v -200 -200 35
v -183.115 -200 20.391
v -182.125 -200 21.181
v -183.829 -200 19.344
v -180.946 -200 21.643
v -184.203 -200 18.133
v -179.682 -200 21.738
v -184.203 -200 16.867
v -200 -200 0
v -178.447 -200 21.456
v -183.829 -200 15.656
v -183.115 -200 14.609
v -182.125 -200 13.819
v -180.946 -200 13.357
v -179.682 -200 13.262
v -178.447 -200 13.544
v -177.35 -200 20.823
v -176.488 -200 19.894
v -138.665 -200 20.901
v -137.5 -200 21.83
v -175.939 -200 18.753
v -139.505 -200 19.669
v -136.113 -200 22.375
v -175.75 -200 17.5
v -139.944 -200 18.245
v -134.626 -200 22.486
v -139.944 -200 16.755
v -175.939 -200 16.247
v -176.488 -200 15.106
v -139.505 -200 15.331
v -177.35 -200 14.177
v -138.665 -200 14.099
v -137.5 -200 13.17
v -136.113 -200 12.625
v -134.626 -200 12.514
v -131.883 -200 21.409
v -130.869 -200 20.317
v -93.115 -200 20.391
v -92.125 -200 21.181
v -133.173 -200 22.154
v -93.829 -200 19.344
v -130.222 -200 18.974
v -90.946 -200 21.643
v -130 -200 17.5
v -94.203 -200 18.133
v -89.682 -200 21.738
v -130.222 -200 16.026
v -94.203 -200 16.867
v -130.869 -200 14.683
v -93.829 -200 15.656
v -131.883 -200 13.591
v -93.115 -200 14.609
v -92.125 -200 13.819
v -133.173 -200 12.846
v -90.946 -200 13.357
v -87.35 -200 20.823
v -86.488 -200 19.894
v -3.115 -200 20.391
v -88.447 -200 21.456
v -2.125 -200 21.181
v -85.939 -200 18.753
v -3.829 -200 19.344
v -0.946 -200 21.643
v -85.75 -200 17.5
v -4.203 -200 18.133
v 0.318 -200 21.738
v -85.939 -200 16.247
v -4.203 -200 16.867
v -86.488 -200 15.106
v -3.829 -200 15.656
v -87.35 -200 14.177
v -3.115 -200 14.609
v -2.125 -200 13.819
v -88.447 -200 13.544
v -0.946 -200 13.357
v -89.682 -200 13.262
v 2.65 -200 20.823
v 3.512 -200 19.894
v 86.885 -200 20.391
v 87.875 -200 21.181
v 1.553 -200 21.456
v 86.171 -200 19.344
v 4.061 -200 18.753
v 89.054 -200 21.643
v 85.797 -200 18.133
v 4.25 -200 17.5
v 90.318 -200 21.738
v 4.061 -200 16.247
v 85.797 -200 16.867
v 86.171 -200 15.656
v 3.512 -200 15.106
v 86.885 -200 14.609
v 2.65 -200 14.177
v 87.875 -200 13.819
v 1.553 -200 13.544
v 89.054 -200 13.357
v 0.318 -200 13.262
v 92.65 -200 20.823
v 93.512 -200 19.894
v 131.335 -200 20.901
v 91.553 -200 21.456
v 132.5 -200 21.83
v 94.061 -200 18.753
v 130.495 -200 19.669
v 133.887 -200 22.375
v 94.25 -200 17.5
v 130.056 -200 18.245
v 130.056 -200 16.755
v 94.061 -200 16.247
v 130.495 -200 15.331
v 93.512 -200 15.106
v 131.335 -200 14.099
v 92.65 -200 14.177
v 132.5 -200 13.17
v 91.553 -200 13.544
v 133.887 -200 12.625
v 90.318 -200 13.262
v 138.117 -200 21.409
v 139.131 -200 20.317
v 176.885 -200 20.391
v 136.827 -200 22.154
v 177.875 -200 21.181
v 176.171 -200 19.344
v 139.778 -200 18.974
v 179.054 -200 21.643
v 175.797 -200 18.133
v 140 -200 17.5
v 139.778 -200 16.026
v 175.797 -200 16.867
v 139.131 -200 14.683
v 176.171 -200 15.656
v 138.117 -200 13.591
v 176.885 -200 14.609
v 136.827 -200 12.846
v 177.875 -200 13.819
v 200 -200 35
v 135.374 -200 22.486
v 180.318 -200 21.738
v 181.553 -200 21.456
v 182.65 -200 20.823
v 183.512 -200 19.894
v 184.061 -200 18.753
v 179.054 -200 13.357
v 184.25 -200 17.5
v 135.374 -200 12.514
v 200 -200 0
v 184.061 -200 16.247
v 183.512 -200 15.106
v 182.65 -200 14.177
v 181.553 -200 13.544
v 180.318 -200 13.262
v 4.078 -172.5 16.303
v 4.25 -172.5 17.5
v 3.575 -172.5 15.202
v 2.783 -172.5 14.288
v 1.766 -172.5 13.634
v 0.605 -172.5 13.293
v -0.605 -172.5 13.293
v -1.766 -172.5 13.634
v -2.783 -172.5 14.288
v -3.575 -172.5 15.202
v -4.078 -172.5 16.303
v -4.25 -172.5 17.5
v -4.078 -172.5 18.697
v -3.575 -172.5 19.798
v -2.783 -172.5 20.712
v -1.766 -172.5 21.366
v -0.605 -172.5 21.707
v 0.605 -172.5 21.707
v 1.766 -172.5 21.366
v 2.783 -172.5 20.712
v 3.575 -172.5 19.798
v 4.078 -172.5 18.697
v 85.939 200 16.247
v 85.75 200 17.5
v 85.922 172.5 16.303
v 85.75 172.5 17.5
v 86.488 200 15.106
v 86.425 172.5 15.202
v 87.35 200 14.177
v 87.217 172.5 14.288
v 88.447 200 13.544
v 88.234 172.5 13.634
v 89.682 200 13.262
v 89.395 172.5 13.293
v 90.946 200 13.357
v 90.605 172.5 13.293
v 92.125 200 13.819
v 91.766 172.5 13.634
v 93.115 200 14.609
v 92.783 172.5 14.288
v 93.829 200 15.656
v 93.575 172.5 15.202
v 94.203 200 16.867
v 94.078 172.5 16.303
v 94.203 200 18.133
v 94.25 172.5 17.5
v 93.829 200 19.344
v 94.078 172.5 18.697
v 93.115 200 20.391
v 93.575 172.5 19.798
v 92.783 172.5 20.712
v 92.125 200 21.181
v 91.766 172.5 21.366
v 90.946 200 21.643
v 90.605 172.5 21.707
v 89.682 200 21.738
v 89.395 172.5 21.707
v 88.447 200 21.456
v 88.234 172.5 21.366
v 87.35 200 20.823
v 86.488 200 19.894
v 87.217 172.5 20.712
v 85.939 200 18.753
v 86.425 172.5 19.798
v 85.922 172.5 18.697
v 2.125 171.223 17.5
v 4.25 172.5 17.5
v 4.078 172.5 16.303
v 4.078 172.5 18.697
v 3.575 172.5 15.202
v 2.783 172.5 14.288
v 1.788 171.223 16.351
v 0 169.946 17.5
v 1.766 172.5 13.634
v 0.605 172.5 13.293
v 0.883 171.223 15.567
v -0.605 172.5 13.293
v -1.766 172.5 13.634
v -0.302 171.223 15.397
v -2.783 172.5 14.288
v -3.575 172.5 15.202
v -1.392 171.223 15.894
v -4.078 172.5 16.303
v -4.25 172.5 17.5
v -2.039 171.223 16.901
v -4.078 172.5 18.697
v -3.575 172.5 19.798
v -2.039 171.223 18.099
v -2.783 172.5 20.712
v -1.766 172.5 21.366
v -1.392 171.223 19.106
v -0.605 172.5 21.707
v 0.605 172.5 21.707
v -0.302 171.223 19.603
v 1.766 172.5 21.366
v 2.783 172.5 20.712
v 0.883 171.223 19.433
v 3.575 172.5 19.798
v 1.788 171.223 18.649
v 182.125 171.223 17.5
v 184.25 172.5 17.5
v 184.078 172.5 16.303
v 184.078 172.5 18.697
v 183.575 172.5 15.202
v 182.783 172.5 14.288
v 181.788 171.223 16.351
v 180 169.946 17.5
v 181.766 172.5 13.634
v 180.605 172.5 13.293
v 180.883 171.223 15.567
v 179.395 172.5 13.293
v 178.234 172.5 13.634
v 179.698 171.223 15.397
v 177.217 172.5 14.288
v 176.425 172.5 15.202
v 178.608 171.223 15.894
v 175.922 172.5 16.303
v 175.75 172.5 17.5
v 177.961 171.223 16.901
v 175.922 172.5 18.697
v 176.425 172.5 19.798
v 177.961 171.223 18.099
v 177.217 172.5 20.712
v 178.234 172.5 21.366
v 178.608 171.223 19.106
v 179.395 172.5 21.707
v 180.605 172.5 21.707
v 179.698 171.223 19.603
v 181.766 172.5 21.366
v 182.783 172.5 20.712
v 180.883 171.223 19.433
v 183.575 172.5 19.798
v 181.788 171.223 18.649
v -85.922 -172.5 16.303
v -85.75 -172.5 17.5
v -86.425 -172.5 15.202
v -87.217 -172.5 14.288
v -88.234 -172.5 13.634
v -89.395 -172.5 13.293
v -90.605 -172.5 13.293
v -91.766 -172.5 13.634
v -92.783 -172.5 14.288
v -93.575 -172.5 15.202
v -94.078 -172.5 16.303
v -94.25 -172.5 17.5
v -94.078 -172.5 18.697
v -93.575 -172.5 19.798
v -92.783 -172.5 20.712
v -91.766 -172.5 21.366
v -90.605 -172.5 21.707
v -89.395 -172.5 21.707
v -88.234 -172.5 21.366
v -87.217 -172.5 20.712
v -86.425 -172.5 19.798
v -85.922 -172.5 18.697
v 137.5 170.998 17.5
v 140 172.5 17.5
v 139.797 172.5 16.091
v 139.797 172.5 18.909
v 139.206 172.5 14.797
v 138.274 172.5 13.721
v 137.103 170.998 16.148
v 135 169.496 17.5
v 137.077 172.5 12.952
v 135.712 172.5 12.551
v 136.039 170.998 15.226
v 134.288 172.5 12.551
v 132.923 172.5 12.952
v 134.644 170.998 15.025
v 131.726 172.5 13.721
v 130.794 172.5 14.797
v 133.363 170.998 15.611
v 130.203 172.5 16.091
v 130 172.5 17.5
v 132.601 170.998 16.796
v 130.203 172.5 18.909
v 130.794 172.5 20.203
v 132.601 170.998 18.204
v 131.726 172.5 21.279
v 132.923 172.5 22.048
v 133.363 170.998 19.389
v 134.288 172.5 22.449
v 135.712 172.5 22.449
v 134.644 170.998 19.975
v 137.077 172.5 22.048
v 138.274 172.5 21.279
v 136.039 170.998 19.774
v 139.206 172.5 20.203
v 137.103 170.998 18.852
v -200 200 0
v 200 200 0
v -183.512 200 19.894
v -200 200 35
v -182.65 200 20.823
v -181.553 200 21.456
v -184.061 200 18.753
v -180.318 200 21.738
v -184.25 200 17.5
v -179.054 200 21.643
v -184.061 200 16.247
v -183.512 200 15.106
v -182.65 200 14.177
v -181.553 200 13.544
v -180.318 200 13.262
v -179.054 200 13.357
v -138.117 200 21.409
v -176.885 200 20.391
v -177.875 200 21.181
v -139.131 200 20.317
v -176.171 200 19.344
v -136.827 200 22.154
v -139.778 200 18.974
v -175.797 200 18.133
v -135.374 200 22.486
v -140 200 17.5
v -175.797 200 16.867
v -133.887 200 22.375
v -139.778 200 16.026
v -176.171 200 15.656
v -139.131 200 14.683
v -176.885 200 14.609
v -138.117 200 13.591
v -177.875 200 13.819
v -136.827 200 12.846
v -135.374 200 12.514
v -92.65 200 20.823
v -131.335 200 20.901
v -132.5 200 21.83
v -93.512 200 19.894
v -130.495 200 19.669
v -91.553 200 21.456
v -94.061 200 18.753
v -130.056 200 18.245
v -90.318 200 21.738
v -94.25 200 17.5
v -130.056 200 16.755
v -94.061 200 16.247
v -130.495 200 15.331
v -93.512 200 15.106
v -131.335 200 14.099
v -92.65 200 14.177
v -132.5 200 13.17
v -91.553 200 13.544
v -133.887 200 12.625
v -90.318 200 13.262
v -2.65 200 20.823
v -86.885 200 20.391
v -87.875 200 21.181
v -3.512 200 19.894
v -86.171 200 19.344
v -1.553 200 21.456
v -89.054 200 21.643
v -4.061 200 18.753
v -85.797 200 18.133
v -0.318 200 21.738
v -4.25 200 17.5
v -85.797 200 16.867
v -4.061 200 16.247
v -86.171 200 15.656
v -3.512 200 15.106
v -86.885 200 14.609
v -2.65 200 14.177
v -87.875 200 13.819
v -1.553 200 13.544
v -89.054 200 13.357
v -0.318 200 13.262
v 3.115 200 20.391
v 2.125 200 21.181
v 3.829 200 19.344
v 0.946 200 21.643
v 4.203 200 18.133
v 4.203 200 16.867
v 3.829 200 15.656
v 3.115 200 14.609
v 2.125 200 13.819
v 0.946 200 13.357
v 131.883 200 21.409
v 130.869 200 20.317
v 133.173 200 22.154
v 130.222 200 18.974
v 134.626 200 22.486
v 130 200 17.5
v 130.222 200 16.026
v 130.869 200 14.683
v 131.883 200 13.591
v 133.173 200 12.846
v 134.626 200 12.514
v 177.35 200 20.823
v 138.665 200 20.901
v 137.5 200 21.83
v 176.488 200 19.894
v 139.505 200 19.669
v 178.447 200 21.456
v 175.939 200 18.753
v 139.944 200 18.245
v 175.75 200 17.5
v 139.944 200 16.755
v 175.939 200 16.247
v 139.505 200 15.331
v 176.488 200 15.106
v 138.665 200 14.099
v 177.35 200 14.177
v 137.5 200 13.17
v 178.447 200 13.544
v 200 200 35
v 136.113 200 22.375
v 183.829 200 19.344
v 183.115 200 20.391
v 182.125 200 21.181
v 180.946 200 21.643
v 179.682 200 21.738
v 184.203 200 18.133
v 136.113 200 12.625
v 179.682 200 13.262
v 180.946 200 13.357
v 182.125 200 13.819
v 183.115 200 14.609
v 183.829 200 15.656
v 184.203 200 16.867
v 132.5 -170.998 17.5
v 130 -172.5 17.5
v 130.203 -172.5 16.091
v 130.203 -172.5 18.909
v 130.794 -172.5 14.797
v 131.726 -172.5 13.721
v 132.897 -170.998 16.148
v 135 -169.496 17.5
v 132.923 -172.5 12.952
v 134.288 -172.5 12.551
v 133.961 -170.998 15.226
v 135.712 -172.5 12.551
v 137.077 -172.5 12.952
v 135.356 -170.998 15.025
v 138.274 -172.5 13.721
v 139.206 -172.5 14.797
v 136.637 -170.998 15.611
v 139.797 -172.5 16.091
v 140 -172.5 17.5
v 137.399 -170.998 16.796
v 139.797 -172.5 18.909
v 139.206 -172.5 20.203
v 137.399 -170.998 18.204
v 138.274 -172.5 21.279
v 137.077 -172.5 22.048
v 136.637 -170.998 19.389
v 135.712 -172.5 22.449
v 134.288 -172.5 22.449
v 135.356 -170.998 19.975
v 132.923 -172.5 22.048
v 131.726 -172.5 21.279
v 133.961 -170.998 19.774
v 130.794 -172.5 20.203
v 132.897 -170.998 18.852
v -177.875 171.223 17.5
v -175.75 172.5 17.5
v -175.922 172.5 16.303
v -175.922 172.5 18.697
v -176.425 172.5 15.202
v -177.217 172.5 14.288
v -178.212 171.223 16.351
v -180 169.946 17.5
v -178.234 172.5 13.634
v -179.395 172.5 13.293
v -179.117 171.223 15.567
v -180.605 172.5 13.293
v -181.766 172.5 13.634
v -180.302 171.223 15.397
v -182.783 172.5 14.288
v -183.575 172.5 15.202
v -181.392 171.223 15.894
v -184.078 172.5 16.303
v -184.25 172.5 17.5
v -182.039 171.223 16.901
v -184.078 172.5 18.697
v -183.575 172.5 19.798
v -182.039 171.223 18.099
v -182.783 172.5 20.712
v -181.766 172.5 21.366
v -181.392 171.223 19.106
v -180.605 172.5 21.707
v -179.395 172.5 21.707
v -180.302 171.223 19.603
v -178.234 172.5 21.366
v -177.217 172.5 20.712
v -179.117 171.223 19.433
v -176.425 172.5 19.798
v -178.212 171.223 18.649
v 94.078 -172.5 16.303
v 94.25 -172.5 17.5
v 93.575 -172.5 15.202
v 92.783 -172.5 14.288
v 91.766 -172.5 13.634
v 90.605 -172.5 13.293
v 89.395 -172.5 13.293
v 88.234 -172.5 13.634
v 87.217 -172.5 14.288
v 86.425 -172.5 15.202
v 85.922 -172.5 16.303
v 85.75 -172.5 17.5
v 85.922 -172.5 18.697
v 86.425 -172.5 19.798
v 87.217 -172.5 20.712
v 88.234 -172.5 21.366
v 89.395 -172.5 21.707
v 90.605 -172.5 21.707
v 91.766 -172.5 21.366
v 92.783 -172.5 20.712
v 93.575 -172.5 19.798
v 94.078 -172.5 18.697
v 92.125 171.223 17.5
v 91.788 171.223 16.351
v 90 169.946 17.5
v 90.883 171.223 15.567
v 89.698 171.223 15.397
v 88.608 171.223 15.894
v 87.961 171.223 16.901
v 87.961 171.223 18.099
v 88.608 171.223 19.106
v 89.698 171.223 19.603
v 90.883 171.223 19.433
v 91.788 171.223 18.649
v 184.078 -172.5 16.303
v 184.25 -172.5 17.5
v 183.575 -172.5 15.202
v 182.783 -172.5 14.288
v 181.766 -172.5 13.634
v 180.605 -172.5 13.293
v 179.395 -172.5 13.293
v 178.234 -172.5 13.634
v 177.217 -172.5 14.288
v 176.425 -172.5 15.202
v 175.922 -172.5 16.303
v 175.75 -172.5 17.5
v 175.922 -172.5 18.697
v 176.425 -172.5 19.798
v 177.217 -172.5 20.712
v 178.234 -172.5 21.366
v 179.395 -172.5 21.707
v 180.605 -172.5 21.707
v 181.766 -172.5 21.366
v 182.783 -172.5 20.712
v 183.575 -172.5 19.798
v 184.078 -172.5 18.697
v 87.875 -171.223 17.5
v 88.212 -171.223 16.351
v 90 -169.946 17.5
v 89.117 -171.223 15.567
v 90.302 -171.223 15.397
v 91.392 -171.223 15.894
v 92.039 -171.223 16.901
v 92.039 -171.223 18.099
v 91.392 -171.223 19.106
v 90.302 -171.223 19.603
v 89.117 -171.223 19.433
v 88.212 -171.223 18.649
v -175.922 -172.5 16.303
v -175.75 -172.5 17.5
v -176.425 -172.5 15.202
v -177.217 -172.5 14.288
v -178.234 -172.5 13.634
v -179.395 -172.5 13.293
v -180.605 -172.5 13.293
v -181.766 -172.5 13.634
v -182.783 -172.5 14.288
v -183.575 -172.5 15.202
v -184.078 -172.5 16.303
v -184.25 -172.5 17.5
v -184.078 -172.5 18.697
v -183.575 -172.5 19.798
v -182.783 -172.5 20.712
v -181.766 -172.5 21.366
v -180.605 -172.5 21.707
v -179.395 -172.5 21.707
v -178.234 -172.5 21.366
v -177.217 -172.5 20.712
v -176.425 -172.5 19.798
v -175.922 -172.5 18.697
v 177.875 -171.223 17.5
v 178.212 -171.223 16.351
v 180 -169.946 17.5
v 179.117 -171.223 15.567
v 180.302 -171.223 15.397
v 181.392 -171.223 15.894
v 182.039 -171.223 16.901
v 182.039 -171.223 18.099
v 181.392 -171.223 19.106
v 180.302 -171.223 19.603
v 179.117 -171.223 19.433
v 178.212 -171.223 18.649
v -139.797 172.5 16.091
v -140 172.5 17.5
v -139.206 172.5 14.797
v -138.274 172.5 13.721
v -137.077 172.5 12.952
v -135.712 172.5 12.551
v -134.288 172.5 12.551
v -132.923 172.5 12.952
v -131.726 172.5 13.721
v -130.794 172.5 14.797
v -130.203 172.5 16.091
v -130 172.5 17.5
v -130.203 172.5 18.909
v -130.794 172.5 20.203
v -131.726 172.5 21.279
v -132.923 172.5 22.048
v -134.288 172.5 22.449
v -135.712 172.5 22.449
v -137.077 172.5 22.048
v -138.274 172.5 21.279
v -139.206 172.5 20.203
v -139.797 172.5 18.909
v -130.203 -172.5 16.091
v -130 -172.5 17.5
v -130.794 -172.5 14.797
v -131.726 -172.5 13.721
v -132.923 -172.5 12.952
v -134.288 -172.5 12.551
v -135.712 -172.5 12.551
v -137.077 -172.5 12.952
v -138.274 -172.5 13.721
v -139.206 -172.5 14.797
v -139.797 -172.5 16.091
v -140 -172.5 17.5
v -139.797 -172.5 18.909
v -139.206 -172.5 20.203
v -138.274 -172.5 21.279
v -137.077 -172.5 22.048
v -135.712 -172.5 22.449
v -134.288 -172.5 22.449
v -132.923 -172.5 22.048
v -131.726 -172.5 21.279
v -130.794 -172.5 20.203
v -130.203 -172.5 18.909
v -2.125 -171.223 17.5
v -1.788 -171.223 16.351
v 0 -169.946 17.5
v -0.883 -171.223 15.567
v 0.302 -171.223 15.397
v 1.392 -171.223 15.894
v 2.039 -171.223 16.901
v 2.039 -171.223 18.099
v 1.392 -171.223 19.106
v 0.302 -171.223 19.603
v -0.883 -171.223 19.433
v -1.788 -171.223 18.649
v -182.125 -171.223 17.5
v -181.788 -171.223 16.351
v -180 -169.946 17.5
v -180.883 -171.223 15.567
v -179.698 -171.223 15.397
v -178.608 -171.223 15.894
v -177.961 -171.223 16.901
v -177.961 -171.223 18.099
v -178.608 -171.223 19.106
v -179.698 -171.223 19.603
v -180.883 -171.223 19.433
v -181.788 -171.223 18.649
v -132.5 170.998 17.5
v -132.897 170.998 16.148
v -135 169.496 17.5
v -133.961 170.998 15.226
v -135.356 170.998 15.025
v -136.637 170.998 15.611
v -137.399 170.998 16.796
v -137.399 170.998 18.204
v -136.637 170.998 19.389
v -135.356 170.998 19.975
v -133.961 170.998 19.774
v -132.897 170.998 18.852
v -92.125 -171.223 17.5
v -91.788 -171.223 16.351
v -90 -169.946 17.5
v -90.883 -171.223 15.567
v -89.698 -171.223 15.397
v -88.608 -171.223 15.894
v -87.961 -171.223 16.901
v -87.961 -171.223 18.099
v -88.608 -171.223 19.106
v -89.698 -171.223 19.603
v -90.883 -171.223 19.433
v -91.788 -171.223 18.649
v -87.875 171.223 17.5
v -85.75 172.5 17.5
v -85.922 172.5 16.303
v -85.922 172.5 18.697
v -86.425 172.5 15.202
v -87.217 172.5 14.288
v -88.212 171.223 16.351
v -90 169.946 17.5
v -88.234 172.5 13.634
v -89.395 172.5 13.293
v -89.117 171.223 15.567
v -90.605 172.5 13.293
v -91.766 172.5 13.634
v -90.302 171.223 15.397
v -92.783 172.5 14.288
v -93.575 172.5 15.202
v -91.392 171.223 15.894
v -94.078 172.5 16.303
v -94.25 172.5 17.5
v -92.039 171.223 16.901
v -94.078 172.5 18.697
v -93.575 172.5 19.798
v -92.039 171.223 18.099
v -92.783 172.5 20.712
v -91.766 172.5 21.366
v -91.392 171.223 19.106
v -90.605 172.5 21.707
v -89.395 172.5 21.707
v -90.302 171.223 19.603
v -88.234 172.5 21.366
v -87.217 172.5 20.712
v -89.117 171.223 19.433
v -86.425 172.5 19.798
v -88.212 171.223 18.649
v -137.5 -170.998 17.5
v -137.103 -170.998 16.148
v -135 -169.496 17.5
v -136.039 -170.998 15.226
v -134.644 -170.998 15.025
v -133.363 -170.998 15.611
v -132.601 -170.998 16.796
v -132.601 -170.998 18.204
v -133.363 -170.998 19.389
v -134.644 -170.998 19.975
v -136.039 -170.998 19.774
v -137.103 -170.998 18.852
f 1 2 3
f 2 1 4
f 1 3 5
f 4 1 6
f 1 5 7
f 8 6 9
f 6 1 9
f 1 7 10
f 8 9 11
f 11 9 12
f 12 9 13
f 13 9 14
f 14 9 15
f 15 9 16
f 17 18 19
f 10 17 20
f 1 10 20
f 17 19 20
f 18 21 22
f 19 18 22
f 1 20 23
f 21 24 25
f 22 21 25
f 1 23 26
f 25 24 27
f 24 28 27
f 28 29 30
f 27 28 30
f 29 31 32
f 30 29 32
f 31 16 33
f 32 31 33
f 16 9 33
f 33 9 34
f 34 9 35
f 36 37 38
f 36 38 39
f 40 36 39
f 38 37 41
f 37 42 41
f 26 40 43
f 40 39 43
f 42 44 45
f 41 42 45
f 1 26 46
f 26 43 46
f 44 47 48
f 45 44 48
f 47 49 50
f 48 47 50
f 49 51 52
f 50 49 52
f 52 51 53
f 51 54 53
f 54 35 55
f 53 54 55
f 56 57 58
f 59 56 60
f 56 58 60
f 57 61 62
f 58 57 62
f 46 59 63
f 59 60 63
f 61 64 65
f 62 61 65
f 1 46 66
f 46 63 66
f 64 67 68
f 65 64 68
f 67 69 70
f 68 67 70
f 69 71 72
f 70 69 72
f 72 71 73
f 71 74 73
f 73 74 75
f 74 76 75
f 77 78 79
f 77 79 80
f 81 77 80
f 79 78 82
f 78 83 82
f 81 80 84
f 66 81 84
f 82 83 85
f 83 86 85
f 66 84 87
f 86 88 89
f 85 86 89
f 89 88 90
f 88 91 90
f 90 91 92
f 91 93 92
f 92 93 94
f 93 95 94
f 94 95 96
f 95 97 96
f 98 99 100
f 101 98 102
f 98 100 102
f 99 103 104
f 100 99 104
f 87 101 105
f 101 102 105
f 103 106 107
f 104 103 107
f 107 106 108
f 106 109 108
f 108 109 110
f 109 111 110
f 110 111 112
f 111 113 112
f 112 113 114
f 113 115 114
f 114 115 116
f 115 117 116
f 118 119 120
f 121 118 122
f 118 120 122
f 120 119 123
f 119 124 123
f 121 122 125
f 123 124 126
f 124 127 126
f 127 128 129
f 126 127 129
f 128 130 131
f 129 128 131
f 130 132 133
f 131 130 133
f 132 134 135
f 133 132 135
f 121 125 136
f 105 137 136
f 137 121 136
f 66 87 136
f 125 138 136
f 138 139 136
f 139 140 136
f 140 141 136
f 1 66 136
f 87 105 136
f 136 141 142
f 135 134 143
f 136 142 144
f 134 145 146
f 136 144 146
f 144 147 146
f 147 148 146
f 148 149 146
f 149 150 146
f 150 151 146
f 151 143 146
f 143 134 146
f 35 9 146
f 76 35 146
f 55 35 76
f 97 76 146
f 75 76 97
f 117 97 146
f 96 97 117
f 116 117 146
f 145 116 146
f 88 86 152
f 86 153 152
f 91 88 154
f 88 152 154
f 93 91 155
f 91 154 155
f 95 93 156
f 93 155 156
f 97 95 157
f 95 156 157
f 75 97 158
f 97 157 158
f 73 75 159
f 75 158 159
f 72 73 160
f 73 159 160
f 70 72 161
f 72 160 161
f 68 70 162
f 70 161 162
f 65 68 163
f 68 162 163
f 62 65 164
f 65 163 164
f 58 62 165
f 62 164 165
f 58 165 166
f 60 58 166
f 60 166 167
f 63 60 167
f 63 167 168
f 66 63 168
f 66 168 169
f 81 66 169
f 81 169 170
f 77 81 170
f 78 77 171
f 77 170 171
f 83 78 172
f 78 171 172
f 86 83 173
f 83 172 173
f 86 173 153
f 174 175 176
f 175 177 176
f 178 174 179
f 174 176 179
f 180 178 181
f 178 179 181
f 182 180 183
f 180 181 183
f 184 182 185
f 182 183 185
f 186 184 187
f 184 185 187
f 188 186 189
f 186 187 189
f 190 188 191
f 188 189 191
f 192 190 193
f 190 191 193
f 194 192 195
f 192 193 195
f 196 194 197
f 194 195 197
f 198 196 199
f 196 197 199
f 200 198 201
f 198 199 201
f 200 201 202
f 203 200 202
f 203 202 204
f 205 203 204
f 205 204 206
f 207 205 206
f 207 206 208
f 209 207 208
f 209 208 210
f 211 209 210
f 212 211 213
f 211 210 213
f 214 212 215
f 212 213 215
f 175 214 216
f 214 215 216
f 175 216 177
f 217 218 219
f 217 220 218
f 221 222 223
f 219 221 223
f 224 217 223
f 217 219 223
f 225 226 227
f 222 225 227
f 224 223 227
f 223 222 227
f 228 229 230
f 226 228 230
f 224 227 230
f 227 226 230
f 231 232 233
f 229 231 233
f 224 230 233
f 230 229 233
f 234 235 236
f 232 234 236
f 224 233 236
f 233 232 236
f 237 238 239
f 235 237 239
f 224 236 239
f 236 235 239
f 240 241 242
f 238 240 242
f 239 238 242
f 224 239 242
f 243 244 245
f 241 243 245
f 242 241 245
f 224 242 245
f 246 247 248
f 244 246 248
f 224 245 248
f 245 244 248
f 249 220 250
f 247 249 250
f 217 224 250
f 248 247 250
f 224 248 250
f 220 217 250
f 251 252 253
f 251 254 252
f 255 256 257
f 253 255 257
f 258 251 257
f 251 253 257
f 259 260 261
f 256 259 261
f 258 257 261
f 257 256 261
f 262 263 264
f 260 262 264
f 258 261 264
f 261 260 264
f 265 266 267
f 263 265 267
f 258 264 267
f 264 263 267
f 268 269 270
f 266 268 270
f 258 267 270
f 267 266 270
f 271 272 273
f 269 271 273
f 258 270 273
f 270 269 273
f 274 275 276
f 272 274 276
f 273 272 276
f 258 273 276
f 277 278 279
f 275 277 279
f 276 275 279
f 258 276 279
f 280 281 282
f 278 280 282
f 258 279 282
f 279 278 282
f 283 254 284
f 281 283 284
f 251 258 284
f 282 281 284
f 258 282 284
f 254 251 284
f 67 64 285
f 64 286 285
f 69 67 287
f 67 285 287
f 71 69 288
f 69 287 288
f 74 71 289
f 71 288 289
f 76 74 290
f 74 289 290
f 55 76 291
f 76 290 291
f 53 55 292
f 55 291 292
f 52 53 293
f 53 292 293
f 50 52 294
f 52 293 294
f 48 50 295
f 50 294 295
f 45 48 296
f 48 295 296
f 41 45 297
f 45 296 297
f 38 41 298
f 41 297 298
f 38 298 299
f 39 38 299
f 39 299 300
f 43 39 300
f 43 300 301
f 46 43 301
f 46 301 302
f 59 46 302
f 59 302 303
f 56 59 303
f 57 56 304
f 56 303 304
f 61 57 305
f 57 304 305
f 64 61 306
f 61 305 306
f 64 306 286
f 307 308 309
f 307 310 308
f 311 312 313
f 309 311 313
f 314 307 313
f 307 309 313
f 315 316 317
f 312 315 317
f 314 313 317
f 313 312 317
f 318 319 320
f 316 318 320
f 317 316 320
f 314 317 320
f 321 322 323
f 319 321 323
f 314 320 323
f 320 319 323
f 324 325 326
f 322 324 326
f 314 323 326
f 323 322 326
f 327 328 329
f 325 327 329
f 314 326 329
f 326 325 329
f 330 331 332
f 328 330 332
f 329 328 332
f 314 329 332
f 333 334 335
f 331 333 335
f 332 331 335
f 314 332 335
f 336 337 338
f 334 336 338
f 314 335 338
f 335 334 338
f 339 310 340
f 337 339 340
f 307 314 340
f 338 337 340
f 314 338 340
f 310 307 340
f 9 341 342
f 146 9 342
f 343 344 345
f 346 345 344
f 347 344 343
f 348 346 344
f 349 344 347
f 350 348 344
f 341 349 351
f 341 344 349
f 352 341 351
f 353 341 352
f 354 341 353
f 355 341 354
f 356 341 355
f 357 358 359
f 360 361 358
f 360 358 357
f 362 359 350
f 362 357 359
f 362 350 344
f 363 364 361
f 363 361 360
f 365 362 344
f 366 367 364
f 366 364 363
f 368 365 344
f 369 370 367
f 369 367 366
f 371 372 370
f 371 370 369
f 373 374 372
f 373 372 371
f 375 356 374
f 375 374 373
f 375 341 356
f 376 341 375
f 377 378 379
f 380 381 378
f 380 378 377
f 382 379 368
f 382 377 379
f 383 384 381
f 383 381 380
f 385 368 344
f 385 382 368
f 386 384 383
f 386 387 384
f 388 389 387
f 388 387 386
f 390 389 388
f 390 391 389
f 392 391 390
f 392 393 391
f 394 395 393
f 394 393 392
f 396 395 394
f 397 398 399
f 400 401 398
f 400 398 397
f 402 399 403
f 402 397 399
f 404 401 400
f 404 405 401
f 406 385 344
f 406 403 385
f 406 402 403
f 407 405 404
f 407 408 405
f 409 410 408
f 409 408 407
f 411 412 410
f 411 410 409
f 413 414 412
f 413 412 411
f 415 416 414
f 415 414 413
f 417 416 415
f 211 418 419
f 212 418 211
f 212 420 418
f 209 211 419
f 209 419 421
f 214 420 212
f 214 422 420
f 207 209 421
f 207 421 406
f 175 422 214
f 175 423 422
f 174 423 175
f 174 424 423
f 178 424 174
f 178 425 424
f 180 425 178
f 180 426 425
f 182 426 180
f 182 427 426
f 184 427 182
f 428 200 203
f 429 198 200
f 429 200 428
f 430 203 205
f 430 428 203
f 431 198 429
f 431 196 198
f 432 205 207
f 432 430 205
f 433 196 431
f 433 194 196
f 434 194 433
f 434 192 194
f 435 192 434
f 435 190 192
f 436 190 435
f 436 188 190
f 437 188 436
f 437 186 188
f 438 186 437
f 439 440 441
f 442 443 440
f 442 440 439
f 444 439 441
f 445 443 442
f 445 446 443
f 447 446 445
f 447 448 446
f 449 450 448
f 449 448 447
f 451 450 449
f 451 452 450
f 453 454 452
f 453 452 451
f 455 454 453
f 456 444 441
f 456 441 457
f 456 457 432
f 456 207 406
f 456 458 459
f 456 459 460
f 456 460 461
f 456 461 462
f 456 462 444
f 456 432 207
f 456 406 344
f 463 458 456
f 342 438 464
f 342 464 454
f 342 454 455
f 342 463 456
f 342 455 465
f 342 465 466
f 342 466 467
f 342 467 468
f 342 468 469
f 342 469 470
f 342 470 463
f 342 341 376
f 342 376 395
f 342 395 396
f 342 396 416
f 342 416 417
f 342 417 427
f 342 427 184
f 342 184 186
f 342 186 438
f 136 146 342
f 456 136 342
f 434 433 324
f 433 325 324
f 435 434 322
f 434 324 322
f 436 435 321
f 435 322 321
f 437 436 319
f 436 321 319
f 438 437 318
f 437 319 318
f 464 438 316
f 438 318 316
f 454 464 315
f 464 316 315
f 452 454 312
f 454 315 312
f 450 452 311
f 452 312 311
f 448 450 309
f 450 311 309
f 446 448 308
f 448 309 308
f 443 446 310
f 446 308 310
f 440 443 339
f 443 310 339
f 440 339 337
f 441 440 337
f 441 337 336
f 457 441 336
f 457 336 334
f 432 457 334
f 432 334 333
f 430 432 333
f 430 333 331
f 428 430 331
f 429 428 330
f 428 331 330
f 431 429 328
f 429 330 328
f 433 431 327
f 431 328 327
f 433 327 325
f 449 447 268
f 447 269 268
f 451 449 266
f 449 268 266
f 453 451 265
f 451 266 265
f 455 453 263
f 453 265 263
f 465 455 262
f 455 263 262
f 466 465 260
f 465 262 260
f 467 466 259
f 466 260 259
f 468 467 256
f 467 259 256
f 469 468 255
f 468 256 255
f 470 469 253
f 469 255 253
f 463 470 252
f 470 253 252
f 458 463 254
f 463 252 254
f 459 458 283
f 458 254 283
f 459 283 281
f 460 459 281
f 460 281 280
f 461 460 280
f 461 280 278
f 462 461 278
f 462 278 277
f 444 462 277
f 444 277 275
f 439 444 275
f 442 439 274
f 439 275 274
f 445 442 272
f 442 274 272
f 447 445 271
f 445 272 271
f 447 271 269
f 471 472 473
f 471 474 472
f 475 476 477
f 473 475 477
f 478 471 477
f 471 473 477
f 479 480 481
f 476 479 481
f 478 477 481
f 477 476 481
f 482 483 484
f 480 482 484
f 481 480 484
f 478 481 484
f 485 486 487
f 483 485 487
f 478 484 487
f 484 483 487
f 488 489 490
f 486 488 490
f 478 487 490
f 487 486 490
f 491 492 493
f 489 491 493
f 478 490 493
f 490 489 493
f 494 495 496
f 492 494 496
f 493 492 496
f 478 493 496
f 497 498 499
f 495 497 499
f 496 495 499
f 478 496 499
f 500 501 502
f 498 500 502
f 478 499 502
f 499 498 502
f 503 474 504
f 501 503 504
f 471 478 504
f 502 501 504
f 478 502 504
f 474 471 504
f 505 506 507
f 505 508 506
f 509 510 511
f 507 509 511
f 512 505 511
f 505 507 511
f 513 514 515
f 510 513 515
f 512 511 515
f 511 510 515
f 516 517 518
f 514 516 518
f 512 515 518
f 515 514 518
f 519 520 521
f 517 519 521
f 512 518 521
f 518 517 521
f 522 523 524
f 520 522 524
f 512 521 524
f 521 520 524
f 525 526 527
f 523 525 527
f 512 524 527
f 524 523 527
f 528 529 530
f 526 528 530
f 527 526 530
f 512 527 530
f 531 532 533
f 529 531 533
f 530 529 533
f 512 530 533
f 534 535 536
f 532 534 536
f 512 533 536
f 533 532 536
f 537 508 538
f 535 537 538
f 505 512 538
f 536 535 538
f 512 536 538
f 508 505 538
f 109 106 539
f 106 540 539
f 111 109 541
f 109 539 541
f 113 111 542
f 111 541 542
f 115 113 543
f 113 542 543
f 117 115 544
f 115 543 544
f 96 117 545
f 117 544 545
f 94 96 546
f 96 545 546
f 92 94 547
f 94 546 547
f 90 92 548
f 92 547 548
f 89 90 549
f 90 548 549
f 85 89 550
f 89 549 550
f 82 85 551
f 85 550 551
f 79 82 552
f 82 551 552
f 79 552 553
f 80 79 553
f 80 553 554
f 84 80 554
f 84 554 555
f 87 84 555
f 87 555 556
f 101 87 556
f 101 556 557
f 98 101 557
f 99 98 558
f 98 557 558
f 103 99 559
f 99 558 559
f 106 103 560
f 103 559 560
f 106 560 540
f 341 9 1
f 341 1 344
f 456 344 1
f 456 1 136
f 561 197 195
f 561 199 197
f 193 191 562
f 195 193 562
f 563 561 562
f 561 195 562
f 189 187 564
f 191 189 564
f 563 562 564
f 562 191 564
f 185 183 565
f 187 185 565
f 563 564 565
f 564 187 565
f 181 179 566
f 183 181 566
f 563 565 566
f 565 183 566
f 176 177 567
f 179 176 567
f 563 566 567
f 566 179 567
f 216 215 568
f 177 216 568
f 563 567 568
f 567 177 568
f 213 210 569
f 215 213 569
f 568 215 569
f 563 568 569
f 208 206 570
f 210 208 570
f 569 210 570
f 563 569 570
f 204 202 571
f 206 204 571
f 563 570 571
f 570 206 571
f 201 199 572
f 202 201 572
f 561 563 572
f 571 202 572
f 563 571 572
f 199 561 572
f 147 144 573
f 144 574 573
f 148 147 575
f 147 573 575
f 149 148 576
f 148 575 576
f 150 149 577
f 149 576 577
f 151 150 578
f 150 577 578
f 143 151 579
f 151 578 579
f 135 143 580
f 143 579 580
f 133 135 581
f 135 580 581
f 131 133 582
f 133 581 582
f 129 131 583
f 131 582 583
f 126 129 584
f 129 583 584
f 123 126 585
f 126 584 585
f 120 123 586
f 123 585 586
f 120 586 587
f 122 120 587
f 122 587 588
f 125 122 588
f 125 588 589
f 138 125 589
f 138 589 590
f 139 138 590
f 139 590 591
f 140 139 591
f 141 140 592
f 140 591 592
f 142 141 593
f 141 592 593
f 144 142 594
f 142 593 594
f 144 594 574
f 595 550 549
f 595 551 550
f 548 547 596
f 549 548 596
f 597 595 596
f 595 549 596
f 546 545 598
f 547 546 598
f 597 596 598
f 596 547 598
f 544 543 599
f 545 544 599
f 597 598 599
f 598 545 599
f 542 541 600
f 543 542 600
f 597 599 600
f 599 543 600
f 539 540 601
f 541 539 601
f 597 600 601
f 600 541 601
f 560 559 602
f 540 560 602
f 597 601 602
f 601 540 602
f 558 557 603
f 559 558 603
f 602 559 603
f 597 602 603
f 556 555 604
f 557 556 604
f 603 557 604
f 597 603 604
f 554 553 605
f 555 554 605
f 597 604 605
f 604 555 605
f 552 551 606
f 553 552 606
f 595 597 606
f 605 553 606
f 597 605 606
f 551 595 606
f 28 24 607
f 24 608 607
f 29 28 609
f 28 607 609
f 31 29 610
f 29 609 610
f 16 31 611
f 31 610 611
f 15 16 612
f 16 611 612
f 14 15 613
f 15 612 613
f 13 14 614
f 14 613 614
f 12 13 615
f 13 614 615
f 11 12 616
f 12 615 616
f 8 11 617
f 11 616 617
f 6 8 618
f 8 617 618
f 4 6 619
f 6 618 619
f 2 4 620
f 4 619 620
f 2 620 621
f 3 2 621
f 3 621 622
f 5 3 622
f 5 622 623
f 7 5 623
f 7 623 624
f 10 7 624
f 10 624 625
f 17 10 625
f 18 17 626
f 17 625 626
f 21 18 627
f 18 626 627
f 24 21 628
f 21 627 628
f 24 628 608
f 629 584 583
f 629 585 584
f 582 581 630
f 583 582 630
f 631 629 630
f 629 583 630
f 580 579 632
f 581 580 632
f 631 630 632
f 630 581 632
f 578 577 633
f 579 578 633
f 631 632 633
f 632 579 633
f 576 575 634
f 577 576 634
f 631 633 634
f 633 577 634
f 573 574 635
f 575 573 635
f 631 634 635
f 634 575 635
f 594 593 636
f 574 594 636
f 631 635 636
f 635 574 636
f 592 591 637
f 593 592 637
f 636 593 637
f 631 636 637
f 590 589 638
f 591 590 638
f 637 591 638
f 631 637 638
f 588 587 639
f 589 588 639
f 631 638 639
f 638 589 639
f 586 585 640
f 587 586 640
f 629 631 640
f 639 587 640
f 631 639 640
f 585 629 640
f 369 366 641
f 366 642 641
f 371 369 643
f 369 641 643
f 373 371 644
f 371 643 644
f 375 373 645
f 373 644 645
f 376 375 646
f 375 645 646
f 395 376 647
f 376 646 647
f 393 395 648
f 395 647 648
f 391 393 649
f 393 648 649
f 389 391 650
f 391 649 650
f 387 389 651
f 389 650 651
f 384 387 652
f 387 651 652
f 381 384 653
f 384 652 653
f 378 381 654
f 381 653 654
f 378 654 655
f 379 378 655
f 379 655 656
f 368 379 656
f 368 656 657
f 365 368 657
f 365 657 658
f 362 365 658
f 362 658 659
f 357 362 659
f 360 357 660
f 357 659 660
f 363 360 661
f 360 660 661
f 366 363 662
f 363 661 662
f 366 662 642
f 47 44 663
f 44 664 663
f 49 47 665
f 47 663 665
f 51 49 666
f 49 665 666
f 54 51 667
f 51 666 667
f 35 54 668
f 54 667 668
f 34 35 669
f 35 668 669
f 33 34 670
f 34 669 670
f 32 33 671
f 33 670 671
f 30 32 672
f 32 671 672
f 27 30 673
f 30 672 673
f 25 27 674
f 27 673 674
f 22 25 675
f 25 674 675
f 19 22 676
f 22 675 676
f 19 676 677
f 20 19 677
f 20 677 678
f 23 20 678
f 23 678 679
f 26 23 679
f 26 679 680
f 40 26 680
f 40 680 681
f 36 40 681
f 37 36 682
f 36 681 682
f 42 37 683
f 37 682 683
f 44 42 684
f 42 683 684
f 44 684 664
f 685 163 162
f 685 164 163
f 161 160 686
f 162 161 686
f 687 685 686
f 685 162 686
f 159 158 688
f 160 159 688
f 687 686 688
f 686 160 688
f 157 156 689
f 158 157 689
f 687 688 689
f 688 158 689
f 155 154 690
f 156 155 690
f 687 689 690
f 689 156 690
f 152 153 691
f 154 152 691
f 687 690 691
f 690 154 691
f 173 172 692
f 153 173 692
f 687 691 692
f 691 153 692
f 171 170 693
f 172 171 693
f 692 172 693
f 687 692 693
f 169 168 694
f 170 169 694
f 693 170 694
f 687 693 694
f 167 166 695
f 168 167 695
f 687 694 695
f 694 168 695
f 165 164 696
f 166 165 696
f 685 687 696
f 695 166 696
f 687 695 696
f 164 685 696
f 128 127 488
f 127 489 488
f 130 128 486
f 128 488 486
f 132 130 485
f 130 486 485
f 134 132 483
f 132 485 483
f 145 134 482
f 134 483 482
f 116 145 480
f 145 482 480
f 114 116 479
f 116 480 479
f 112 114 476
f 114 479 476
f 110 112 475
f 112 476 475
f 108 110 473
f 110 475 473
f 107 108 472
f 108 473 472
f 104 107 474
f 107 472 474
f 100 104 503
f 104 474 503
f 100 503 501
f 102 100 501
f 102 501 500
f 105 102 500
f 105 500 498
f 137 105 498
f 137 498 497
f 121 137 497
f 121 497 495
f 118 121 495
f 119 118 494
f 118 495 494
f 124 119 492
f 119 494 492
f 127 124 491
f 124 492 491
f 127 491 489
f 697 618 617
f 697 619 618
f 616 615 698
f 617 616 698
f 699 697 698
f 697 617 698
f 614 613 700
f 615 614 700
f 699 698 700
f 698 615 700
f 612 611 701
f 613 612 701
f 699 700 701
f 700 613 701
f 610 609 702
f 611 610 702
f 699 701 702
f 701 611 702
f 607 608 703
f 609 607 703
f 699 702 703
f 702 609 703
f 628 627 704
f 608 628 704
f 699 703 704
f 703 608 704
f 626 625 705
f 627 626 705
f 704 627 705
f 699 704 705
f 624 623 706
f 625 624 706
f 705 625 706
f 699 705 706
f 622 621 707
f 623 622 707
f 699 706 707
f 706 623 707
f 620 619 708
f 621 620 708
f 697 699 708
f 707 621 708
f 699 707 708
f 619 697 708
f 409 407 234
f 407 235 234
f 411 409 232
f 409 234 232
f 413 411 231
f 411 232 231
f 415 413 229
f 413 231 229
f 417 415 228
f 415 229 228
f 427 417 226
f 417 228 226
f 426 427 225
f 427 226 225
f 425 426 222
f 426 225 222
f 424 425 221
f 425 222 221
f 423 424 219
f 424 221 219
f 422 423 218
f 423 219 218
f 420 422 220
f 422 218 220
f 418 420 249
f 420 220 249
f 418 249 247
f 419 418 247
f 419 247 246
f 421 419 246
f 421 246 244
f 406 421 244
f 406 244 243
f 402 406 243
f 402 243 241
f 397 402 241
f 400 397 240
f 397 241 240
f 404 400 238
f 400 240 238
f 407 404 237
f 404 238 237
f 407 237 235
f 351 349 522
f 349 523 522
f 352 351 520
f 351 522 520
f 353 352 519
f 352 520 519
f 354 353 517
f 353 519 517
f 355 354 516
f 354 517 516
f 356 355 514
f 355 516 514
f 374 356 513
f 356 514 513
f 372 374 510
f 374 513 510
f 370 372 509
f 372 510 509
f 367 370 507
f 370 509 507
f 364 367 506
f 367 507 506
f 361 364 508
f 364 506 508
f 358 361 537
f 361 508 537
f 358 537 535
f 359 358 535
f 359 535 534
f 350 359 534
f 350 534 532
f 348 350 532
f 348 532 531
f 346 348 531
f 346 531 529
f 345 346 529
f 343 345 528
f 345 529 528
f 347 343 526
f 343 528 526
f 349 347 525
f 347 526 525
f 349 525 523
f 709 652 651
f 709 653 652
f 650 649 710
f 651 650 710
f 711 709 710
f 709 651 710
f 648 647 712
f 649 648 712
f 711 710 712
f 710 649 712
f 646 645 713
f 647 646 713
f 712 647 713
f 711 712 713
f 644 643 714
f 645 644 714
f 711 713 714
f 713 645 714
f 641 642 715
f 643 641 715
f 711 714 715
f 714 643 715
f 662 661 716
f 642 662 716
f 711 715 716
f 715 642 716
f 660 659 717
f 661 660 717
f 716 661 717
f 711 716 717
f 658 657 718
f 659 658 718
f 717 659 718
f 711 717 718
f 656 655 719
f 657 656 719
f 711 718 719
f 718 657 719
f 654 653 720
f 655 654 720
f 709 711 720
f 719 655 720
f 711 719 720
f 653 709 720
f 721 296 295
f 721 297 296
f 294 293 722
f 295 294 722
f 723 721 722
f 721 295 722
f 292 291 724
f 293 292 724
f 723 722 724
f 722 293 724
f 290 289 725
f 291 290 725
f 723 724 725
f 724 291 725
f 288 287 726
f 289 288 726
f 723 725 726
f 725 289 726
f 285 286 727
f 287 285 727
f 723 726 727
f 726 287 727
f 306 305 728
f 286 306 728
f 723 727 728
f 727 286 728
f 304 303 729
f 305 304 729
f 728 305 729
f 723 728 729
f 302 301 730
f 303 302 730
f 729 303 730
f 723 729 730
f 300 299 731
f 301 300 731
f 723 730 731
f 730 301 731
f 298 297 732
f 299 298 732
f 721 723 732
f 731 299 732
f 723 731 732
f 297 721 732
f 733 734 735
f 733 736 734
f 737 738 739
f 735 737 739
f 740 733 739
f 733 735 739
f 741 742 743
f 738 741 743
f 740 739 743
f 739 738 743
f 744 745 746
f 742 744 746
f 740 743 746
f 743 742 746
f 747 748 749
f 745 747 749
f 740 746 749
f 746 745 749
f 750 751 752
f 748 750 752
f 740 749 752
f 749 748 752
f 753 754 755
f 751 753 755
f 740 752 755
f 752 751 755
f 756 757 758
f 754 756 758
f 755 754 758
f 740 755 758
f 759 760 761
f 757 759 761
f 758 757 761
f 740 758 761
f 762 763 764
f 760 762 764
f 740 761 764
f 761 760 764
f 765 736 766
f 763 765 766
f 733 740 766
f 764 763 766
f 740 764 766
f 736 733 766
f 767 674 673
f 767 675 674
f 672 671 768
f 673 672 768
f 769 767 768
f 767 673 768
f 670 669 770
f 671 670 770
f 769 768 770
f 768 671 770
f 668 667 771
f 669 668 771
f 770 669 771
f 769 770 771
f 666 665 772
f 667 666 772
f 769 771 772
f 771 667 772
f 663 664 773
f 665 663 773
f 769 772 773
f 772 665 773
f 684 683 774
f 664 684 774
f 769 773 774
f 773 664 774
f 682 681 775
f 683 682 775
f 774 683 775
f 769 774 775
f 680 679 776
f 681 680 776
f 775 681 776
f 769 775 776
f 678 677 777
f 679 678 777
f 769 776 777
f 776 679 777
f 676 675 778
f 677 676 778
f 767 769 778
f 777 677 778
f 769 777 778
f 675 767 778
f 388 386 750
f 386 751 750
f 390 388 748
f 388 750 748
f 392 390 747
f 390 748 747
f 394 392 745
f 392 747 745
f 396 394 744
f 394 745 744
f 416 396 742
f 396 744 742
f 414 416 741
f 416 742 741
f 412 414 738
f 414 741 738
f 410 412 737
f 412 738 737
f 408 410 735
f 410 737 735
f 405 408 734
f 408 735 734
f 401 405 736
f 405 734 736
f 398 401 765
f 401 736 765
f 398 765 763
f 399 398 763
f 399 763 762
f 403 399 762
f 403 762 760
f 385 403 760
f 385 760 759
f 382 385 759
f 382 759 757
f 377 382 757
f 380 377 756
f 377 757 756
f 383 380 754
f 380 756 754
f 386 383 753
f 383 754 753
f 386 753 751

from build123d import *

# Parameters (mm, degrees)
ESBO_O1_W                    = 400
ESBO_O1_H                    = 400
RESSALTO_EXTRUS_O1_DEPTH     = 35
FURO_ROSCADO_DE_M103_D       = 8.5
FURO_ROSCADO_DE_M103_DEPTH   = 27.5
FURO_ROSCADO_DE_M103_TIP     = 2.553657631
FURO_ROSCADO_DE_M104_D       = 8.5
FURO_ROSCADO_DE_M104_DEPTH   = 27.5
FURO_ROSCADO_DE_M104_TIP     = 2.553657631
FUROS_GUIA_COM_10_0MM3_D     = 10
FUROS_GUIA_COM_10_0MM3_DEPTH = 27.5
FUROS_GUIA_COM_10_0MM3_TIP   = 3.004303095
FUROS_GUIA_COM_10_0MM4_D     = 10
FUROS_GUIA_COM_10_0MM4_DEPTH = 27.5
FUROS_GUIA_COM_10_0MM4_TIP   = 3.004303095


with BuildPart() as part:
    # Esboço1 → Ressalto-extrusão1 (new body)
    with BuildSketch(Plane.XY):
        Rectangle(ESBO_O1_W, ESBO_O1_H)
    extrude(amount=RESSALTO_EXTRUS_O1_DEPTH)

    # Furo roscado de M103
    with Locations(Plane(origin=(0, 200, 0), x_dir=(1, 0, 0), z_dir=(0, 1, 0))):
        with Locations((-180, -17.5), (-90, -17.5), (0, -17.5), (90, -17.5), (180, -17.5)):
            Hole(FURO_ROSCADO_DE_M103_D / 2, depth=FURO_ROSCADO_DE_M103_DEPTH)
            with Locations((0, 0, -(FURO_ROSCADO_DE_M103_DEPTH + FURO_ROSCADO_DE_M103_TIP / 2))):  # 118° drill point
                Cone(0, FURO_ROSCADO_DE_M103_D / 2, FURO_ROSCADO_DE_M103_TIP, mode=Mode.SUBTRACT)

    # Furo roscado de M104
    with Locations(Plane(origin=(0, -200, 0), x_dir=(-1, 0, 0), z_dir=(0, -1, 0))):
        with Locations((180, -17.5), (90, -17.5), (0, -17.5), (-90, -17.5), (-180, -17.5)):
            Hole(FURO_ROSCADO_DE_M104_D / 2, depth=FURO_ROSCADO_DE_M104_DEPTH)
            with Locations((0, 0, -(FURO_ROSCADO_DE_M104_DEPTH + FURO_ROSCADO_DE_M104_TIP / 2))):  # 118° drill point
                Cone(0, FURO_ROSCADO_DE_M104_D / 2, FURO_ROSCADO_DE_M104_TIP, mode=Mode.SUBTRACT)

    # Furos-guia com Ø10.0mm3
    with Locations(Plane(origin=(0, -200, 0), x_dir=(-1, 0, 0), z_dir=(0, -1, 0))):
        with Locations((135, -17.5), (-135, -17.5)):
            Hole(FUROS_GUIA_COM_10_0MM3_D / 2, depth=FUROS_GUIA_COM_10_0MM3_DEPTH)
            with Locations((0, 0, -(FUROS_GUIA_COM_10_0MM3_DEPTH + FUROS_GUIA_COM_10_0MM3_TIP / 2))):  # 118° drill point
                Cone(0, FUROS_GUIA_COM_10_0MM3_D / 2, FUROS_GUIA_COM_10_0MM3_TIP, mode=Mode.SUBTRACT)

    # Furos-guia com Ø10.0mm4
    with Locations(Plane(origin=(0, 200, 0), x_dir=(1, 0, 0), z_dir=(0, 1, 0))):
        with Locations((-135, -17.5), (135, -17.5)):
            Hole(FUROS_GUIA_COM_10_0MM4_D / 2, depth=FUROS_GUIA_COM_10_0MM4_DEPTH)
            with Locations((0, 0, -(FUROS_GUIA_COM_10_0MM4_DEPTH + FUROS_GUIA_COM_10_0MM4_TIP / 2))):  # 118° drill point
                Cone(0, FUROS_GUIA_COM_10_0MM4_D / 2, FUROS_GUIA_COM_10_0MM4_TIP, mode=Mode.SUBTRACT)


solid = part.part
